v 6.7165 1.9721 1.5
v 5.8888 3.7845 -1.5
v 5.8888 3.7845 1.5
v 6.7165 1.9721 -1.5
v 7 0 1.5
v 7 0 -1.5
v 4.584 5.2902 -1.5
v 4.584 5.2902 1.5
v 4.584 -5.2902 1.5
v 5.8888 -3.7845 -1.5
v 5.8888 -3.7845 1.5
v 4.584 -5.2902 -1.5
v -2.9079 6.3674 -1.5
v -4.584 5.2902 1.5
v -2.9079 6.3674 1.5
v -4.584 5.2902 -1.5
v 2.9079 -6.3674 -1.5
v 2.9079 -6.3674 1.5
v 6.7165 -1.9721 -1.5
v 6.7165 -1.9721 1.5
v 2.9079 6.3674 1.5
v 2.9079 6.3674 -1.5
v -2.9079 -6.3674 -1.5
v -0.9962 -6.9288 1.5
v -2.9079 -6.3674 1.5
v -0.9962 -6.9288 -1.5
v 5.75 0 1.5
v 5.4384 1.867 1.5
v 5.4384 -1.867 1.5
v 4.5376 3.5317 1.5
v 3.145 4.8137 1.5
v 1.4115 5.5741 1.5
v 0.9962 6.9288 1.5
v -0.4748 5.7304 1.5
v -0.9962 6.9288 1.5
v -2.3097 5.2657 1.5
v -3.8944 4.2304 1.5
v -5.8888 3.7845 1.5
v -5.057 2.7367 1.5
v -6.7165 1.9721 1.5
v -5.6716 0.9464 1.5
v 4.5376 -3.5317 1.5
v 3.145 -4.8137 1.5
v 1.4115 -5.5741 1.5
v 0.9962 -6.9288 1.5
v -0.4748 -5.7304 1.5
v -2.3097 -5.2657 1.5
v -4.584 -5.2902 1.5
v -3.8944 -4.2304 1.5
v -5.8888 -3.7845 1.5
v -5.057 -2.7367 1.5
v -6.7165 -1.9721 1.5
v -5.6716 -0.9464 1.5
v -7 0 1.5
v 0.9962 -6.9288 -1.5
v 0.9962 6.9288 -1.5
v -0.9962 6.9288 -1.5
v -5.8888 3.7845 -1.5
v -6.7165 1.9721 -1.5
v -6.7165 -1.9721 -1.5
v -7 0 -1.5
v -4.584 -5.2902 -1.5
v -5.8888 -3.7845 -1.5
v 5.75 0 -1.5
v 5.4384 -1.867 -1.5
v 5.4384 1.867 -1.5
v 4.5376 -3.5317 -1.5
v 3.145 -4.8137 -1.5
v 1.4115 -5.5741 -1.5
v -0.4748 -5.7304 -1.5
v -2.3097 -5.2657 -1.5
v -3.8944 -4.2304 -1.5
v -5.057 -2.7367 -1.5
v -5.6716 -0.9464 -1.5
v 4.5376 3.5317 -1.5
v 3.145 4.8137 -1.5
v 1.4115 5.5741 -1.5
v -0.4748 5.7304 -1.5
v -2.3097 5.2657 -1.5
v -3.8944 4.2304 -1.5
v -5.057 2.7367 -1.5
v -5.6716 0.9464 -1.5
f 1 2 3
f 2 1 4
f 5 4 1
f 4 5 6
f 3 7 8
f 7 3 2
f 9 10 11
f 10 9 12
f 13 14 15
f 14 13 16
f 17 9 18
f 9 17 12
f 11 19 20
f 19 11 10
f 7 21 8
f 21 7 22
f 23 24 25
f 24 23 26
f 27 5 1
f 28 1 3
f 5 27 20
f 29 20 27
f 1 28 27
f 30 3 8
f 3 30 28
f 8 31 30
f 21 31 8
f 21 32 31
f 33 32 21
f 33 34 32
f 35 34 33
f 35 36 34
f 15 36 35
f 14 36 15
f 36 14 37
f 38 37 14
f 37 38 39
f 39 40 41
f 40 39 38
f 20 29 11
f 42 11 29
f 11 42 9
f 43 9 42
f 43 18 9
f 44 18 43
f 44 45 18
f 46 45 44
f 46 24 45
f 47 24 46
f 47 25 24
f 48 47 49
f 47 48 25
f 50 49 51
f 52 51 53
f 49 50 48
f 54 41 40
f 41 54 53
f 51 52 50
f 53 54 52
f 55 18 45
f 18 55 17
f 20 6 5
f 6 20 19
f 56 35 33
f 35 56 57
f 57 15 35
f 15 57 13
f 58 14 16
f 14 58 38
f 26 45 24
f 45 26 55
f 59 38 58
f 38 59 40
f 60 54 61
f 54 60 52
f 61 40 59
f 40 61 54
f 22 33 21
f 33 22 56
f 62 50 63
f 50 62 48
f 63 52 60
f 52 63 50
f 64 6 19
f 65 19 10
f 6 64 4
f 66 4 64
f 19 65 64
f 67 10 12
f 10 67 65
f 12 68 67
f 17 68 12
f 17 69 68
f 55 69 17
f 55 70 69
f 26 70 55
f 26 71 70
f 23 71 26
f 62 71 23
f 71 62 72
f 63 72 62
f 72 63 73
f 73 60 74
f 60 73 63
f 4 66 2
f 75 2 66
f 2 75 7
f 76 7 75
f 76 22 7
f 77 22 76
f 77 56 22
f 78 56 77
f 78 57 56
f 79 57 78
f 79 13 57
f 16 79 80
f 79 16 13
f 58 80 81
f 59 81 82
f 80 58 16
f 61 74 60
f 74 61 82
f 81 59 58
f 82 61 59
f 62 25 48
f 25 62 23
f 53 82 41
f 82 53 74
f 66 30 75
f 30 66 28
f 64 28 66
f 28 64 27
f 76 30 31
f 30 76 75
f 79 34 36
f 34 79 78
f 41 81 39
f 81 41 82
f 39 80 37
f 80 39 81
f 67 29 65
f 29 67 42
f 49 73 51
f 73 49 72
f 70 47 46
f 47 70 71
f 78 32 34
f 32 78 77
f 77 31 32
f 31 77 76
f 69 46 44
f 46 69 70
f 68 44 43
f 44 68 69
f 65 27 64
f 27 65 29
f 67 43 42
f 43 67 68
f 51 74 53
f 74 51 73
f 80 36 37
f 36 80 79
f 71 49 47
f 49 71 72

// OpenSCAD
//ring, tight one has diameter of 11
// interesting site: https://www.printables.com/model/253391-customizable-engraved-rings
inside_dia=5.75;
out_dia= 7;
difference()
{
    cylinder(h=3,r1=out_dia,r2=out_dia,center=true);
cylinder(h=7,r1=inside_dia,r2=inside_dia,center=true);

}
